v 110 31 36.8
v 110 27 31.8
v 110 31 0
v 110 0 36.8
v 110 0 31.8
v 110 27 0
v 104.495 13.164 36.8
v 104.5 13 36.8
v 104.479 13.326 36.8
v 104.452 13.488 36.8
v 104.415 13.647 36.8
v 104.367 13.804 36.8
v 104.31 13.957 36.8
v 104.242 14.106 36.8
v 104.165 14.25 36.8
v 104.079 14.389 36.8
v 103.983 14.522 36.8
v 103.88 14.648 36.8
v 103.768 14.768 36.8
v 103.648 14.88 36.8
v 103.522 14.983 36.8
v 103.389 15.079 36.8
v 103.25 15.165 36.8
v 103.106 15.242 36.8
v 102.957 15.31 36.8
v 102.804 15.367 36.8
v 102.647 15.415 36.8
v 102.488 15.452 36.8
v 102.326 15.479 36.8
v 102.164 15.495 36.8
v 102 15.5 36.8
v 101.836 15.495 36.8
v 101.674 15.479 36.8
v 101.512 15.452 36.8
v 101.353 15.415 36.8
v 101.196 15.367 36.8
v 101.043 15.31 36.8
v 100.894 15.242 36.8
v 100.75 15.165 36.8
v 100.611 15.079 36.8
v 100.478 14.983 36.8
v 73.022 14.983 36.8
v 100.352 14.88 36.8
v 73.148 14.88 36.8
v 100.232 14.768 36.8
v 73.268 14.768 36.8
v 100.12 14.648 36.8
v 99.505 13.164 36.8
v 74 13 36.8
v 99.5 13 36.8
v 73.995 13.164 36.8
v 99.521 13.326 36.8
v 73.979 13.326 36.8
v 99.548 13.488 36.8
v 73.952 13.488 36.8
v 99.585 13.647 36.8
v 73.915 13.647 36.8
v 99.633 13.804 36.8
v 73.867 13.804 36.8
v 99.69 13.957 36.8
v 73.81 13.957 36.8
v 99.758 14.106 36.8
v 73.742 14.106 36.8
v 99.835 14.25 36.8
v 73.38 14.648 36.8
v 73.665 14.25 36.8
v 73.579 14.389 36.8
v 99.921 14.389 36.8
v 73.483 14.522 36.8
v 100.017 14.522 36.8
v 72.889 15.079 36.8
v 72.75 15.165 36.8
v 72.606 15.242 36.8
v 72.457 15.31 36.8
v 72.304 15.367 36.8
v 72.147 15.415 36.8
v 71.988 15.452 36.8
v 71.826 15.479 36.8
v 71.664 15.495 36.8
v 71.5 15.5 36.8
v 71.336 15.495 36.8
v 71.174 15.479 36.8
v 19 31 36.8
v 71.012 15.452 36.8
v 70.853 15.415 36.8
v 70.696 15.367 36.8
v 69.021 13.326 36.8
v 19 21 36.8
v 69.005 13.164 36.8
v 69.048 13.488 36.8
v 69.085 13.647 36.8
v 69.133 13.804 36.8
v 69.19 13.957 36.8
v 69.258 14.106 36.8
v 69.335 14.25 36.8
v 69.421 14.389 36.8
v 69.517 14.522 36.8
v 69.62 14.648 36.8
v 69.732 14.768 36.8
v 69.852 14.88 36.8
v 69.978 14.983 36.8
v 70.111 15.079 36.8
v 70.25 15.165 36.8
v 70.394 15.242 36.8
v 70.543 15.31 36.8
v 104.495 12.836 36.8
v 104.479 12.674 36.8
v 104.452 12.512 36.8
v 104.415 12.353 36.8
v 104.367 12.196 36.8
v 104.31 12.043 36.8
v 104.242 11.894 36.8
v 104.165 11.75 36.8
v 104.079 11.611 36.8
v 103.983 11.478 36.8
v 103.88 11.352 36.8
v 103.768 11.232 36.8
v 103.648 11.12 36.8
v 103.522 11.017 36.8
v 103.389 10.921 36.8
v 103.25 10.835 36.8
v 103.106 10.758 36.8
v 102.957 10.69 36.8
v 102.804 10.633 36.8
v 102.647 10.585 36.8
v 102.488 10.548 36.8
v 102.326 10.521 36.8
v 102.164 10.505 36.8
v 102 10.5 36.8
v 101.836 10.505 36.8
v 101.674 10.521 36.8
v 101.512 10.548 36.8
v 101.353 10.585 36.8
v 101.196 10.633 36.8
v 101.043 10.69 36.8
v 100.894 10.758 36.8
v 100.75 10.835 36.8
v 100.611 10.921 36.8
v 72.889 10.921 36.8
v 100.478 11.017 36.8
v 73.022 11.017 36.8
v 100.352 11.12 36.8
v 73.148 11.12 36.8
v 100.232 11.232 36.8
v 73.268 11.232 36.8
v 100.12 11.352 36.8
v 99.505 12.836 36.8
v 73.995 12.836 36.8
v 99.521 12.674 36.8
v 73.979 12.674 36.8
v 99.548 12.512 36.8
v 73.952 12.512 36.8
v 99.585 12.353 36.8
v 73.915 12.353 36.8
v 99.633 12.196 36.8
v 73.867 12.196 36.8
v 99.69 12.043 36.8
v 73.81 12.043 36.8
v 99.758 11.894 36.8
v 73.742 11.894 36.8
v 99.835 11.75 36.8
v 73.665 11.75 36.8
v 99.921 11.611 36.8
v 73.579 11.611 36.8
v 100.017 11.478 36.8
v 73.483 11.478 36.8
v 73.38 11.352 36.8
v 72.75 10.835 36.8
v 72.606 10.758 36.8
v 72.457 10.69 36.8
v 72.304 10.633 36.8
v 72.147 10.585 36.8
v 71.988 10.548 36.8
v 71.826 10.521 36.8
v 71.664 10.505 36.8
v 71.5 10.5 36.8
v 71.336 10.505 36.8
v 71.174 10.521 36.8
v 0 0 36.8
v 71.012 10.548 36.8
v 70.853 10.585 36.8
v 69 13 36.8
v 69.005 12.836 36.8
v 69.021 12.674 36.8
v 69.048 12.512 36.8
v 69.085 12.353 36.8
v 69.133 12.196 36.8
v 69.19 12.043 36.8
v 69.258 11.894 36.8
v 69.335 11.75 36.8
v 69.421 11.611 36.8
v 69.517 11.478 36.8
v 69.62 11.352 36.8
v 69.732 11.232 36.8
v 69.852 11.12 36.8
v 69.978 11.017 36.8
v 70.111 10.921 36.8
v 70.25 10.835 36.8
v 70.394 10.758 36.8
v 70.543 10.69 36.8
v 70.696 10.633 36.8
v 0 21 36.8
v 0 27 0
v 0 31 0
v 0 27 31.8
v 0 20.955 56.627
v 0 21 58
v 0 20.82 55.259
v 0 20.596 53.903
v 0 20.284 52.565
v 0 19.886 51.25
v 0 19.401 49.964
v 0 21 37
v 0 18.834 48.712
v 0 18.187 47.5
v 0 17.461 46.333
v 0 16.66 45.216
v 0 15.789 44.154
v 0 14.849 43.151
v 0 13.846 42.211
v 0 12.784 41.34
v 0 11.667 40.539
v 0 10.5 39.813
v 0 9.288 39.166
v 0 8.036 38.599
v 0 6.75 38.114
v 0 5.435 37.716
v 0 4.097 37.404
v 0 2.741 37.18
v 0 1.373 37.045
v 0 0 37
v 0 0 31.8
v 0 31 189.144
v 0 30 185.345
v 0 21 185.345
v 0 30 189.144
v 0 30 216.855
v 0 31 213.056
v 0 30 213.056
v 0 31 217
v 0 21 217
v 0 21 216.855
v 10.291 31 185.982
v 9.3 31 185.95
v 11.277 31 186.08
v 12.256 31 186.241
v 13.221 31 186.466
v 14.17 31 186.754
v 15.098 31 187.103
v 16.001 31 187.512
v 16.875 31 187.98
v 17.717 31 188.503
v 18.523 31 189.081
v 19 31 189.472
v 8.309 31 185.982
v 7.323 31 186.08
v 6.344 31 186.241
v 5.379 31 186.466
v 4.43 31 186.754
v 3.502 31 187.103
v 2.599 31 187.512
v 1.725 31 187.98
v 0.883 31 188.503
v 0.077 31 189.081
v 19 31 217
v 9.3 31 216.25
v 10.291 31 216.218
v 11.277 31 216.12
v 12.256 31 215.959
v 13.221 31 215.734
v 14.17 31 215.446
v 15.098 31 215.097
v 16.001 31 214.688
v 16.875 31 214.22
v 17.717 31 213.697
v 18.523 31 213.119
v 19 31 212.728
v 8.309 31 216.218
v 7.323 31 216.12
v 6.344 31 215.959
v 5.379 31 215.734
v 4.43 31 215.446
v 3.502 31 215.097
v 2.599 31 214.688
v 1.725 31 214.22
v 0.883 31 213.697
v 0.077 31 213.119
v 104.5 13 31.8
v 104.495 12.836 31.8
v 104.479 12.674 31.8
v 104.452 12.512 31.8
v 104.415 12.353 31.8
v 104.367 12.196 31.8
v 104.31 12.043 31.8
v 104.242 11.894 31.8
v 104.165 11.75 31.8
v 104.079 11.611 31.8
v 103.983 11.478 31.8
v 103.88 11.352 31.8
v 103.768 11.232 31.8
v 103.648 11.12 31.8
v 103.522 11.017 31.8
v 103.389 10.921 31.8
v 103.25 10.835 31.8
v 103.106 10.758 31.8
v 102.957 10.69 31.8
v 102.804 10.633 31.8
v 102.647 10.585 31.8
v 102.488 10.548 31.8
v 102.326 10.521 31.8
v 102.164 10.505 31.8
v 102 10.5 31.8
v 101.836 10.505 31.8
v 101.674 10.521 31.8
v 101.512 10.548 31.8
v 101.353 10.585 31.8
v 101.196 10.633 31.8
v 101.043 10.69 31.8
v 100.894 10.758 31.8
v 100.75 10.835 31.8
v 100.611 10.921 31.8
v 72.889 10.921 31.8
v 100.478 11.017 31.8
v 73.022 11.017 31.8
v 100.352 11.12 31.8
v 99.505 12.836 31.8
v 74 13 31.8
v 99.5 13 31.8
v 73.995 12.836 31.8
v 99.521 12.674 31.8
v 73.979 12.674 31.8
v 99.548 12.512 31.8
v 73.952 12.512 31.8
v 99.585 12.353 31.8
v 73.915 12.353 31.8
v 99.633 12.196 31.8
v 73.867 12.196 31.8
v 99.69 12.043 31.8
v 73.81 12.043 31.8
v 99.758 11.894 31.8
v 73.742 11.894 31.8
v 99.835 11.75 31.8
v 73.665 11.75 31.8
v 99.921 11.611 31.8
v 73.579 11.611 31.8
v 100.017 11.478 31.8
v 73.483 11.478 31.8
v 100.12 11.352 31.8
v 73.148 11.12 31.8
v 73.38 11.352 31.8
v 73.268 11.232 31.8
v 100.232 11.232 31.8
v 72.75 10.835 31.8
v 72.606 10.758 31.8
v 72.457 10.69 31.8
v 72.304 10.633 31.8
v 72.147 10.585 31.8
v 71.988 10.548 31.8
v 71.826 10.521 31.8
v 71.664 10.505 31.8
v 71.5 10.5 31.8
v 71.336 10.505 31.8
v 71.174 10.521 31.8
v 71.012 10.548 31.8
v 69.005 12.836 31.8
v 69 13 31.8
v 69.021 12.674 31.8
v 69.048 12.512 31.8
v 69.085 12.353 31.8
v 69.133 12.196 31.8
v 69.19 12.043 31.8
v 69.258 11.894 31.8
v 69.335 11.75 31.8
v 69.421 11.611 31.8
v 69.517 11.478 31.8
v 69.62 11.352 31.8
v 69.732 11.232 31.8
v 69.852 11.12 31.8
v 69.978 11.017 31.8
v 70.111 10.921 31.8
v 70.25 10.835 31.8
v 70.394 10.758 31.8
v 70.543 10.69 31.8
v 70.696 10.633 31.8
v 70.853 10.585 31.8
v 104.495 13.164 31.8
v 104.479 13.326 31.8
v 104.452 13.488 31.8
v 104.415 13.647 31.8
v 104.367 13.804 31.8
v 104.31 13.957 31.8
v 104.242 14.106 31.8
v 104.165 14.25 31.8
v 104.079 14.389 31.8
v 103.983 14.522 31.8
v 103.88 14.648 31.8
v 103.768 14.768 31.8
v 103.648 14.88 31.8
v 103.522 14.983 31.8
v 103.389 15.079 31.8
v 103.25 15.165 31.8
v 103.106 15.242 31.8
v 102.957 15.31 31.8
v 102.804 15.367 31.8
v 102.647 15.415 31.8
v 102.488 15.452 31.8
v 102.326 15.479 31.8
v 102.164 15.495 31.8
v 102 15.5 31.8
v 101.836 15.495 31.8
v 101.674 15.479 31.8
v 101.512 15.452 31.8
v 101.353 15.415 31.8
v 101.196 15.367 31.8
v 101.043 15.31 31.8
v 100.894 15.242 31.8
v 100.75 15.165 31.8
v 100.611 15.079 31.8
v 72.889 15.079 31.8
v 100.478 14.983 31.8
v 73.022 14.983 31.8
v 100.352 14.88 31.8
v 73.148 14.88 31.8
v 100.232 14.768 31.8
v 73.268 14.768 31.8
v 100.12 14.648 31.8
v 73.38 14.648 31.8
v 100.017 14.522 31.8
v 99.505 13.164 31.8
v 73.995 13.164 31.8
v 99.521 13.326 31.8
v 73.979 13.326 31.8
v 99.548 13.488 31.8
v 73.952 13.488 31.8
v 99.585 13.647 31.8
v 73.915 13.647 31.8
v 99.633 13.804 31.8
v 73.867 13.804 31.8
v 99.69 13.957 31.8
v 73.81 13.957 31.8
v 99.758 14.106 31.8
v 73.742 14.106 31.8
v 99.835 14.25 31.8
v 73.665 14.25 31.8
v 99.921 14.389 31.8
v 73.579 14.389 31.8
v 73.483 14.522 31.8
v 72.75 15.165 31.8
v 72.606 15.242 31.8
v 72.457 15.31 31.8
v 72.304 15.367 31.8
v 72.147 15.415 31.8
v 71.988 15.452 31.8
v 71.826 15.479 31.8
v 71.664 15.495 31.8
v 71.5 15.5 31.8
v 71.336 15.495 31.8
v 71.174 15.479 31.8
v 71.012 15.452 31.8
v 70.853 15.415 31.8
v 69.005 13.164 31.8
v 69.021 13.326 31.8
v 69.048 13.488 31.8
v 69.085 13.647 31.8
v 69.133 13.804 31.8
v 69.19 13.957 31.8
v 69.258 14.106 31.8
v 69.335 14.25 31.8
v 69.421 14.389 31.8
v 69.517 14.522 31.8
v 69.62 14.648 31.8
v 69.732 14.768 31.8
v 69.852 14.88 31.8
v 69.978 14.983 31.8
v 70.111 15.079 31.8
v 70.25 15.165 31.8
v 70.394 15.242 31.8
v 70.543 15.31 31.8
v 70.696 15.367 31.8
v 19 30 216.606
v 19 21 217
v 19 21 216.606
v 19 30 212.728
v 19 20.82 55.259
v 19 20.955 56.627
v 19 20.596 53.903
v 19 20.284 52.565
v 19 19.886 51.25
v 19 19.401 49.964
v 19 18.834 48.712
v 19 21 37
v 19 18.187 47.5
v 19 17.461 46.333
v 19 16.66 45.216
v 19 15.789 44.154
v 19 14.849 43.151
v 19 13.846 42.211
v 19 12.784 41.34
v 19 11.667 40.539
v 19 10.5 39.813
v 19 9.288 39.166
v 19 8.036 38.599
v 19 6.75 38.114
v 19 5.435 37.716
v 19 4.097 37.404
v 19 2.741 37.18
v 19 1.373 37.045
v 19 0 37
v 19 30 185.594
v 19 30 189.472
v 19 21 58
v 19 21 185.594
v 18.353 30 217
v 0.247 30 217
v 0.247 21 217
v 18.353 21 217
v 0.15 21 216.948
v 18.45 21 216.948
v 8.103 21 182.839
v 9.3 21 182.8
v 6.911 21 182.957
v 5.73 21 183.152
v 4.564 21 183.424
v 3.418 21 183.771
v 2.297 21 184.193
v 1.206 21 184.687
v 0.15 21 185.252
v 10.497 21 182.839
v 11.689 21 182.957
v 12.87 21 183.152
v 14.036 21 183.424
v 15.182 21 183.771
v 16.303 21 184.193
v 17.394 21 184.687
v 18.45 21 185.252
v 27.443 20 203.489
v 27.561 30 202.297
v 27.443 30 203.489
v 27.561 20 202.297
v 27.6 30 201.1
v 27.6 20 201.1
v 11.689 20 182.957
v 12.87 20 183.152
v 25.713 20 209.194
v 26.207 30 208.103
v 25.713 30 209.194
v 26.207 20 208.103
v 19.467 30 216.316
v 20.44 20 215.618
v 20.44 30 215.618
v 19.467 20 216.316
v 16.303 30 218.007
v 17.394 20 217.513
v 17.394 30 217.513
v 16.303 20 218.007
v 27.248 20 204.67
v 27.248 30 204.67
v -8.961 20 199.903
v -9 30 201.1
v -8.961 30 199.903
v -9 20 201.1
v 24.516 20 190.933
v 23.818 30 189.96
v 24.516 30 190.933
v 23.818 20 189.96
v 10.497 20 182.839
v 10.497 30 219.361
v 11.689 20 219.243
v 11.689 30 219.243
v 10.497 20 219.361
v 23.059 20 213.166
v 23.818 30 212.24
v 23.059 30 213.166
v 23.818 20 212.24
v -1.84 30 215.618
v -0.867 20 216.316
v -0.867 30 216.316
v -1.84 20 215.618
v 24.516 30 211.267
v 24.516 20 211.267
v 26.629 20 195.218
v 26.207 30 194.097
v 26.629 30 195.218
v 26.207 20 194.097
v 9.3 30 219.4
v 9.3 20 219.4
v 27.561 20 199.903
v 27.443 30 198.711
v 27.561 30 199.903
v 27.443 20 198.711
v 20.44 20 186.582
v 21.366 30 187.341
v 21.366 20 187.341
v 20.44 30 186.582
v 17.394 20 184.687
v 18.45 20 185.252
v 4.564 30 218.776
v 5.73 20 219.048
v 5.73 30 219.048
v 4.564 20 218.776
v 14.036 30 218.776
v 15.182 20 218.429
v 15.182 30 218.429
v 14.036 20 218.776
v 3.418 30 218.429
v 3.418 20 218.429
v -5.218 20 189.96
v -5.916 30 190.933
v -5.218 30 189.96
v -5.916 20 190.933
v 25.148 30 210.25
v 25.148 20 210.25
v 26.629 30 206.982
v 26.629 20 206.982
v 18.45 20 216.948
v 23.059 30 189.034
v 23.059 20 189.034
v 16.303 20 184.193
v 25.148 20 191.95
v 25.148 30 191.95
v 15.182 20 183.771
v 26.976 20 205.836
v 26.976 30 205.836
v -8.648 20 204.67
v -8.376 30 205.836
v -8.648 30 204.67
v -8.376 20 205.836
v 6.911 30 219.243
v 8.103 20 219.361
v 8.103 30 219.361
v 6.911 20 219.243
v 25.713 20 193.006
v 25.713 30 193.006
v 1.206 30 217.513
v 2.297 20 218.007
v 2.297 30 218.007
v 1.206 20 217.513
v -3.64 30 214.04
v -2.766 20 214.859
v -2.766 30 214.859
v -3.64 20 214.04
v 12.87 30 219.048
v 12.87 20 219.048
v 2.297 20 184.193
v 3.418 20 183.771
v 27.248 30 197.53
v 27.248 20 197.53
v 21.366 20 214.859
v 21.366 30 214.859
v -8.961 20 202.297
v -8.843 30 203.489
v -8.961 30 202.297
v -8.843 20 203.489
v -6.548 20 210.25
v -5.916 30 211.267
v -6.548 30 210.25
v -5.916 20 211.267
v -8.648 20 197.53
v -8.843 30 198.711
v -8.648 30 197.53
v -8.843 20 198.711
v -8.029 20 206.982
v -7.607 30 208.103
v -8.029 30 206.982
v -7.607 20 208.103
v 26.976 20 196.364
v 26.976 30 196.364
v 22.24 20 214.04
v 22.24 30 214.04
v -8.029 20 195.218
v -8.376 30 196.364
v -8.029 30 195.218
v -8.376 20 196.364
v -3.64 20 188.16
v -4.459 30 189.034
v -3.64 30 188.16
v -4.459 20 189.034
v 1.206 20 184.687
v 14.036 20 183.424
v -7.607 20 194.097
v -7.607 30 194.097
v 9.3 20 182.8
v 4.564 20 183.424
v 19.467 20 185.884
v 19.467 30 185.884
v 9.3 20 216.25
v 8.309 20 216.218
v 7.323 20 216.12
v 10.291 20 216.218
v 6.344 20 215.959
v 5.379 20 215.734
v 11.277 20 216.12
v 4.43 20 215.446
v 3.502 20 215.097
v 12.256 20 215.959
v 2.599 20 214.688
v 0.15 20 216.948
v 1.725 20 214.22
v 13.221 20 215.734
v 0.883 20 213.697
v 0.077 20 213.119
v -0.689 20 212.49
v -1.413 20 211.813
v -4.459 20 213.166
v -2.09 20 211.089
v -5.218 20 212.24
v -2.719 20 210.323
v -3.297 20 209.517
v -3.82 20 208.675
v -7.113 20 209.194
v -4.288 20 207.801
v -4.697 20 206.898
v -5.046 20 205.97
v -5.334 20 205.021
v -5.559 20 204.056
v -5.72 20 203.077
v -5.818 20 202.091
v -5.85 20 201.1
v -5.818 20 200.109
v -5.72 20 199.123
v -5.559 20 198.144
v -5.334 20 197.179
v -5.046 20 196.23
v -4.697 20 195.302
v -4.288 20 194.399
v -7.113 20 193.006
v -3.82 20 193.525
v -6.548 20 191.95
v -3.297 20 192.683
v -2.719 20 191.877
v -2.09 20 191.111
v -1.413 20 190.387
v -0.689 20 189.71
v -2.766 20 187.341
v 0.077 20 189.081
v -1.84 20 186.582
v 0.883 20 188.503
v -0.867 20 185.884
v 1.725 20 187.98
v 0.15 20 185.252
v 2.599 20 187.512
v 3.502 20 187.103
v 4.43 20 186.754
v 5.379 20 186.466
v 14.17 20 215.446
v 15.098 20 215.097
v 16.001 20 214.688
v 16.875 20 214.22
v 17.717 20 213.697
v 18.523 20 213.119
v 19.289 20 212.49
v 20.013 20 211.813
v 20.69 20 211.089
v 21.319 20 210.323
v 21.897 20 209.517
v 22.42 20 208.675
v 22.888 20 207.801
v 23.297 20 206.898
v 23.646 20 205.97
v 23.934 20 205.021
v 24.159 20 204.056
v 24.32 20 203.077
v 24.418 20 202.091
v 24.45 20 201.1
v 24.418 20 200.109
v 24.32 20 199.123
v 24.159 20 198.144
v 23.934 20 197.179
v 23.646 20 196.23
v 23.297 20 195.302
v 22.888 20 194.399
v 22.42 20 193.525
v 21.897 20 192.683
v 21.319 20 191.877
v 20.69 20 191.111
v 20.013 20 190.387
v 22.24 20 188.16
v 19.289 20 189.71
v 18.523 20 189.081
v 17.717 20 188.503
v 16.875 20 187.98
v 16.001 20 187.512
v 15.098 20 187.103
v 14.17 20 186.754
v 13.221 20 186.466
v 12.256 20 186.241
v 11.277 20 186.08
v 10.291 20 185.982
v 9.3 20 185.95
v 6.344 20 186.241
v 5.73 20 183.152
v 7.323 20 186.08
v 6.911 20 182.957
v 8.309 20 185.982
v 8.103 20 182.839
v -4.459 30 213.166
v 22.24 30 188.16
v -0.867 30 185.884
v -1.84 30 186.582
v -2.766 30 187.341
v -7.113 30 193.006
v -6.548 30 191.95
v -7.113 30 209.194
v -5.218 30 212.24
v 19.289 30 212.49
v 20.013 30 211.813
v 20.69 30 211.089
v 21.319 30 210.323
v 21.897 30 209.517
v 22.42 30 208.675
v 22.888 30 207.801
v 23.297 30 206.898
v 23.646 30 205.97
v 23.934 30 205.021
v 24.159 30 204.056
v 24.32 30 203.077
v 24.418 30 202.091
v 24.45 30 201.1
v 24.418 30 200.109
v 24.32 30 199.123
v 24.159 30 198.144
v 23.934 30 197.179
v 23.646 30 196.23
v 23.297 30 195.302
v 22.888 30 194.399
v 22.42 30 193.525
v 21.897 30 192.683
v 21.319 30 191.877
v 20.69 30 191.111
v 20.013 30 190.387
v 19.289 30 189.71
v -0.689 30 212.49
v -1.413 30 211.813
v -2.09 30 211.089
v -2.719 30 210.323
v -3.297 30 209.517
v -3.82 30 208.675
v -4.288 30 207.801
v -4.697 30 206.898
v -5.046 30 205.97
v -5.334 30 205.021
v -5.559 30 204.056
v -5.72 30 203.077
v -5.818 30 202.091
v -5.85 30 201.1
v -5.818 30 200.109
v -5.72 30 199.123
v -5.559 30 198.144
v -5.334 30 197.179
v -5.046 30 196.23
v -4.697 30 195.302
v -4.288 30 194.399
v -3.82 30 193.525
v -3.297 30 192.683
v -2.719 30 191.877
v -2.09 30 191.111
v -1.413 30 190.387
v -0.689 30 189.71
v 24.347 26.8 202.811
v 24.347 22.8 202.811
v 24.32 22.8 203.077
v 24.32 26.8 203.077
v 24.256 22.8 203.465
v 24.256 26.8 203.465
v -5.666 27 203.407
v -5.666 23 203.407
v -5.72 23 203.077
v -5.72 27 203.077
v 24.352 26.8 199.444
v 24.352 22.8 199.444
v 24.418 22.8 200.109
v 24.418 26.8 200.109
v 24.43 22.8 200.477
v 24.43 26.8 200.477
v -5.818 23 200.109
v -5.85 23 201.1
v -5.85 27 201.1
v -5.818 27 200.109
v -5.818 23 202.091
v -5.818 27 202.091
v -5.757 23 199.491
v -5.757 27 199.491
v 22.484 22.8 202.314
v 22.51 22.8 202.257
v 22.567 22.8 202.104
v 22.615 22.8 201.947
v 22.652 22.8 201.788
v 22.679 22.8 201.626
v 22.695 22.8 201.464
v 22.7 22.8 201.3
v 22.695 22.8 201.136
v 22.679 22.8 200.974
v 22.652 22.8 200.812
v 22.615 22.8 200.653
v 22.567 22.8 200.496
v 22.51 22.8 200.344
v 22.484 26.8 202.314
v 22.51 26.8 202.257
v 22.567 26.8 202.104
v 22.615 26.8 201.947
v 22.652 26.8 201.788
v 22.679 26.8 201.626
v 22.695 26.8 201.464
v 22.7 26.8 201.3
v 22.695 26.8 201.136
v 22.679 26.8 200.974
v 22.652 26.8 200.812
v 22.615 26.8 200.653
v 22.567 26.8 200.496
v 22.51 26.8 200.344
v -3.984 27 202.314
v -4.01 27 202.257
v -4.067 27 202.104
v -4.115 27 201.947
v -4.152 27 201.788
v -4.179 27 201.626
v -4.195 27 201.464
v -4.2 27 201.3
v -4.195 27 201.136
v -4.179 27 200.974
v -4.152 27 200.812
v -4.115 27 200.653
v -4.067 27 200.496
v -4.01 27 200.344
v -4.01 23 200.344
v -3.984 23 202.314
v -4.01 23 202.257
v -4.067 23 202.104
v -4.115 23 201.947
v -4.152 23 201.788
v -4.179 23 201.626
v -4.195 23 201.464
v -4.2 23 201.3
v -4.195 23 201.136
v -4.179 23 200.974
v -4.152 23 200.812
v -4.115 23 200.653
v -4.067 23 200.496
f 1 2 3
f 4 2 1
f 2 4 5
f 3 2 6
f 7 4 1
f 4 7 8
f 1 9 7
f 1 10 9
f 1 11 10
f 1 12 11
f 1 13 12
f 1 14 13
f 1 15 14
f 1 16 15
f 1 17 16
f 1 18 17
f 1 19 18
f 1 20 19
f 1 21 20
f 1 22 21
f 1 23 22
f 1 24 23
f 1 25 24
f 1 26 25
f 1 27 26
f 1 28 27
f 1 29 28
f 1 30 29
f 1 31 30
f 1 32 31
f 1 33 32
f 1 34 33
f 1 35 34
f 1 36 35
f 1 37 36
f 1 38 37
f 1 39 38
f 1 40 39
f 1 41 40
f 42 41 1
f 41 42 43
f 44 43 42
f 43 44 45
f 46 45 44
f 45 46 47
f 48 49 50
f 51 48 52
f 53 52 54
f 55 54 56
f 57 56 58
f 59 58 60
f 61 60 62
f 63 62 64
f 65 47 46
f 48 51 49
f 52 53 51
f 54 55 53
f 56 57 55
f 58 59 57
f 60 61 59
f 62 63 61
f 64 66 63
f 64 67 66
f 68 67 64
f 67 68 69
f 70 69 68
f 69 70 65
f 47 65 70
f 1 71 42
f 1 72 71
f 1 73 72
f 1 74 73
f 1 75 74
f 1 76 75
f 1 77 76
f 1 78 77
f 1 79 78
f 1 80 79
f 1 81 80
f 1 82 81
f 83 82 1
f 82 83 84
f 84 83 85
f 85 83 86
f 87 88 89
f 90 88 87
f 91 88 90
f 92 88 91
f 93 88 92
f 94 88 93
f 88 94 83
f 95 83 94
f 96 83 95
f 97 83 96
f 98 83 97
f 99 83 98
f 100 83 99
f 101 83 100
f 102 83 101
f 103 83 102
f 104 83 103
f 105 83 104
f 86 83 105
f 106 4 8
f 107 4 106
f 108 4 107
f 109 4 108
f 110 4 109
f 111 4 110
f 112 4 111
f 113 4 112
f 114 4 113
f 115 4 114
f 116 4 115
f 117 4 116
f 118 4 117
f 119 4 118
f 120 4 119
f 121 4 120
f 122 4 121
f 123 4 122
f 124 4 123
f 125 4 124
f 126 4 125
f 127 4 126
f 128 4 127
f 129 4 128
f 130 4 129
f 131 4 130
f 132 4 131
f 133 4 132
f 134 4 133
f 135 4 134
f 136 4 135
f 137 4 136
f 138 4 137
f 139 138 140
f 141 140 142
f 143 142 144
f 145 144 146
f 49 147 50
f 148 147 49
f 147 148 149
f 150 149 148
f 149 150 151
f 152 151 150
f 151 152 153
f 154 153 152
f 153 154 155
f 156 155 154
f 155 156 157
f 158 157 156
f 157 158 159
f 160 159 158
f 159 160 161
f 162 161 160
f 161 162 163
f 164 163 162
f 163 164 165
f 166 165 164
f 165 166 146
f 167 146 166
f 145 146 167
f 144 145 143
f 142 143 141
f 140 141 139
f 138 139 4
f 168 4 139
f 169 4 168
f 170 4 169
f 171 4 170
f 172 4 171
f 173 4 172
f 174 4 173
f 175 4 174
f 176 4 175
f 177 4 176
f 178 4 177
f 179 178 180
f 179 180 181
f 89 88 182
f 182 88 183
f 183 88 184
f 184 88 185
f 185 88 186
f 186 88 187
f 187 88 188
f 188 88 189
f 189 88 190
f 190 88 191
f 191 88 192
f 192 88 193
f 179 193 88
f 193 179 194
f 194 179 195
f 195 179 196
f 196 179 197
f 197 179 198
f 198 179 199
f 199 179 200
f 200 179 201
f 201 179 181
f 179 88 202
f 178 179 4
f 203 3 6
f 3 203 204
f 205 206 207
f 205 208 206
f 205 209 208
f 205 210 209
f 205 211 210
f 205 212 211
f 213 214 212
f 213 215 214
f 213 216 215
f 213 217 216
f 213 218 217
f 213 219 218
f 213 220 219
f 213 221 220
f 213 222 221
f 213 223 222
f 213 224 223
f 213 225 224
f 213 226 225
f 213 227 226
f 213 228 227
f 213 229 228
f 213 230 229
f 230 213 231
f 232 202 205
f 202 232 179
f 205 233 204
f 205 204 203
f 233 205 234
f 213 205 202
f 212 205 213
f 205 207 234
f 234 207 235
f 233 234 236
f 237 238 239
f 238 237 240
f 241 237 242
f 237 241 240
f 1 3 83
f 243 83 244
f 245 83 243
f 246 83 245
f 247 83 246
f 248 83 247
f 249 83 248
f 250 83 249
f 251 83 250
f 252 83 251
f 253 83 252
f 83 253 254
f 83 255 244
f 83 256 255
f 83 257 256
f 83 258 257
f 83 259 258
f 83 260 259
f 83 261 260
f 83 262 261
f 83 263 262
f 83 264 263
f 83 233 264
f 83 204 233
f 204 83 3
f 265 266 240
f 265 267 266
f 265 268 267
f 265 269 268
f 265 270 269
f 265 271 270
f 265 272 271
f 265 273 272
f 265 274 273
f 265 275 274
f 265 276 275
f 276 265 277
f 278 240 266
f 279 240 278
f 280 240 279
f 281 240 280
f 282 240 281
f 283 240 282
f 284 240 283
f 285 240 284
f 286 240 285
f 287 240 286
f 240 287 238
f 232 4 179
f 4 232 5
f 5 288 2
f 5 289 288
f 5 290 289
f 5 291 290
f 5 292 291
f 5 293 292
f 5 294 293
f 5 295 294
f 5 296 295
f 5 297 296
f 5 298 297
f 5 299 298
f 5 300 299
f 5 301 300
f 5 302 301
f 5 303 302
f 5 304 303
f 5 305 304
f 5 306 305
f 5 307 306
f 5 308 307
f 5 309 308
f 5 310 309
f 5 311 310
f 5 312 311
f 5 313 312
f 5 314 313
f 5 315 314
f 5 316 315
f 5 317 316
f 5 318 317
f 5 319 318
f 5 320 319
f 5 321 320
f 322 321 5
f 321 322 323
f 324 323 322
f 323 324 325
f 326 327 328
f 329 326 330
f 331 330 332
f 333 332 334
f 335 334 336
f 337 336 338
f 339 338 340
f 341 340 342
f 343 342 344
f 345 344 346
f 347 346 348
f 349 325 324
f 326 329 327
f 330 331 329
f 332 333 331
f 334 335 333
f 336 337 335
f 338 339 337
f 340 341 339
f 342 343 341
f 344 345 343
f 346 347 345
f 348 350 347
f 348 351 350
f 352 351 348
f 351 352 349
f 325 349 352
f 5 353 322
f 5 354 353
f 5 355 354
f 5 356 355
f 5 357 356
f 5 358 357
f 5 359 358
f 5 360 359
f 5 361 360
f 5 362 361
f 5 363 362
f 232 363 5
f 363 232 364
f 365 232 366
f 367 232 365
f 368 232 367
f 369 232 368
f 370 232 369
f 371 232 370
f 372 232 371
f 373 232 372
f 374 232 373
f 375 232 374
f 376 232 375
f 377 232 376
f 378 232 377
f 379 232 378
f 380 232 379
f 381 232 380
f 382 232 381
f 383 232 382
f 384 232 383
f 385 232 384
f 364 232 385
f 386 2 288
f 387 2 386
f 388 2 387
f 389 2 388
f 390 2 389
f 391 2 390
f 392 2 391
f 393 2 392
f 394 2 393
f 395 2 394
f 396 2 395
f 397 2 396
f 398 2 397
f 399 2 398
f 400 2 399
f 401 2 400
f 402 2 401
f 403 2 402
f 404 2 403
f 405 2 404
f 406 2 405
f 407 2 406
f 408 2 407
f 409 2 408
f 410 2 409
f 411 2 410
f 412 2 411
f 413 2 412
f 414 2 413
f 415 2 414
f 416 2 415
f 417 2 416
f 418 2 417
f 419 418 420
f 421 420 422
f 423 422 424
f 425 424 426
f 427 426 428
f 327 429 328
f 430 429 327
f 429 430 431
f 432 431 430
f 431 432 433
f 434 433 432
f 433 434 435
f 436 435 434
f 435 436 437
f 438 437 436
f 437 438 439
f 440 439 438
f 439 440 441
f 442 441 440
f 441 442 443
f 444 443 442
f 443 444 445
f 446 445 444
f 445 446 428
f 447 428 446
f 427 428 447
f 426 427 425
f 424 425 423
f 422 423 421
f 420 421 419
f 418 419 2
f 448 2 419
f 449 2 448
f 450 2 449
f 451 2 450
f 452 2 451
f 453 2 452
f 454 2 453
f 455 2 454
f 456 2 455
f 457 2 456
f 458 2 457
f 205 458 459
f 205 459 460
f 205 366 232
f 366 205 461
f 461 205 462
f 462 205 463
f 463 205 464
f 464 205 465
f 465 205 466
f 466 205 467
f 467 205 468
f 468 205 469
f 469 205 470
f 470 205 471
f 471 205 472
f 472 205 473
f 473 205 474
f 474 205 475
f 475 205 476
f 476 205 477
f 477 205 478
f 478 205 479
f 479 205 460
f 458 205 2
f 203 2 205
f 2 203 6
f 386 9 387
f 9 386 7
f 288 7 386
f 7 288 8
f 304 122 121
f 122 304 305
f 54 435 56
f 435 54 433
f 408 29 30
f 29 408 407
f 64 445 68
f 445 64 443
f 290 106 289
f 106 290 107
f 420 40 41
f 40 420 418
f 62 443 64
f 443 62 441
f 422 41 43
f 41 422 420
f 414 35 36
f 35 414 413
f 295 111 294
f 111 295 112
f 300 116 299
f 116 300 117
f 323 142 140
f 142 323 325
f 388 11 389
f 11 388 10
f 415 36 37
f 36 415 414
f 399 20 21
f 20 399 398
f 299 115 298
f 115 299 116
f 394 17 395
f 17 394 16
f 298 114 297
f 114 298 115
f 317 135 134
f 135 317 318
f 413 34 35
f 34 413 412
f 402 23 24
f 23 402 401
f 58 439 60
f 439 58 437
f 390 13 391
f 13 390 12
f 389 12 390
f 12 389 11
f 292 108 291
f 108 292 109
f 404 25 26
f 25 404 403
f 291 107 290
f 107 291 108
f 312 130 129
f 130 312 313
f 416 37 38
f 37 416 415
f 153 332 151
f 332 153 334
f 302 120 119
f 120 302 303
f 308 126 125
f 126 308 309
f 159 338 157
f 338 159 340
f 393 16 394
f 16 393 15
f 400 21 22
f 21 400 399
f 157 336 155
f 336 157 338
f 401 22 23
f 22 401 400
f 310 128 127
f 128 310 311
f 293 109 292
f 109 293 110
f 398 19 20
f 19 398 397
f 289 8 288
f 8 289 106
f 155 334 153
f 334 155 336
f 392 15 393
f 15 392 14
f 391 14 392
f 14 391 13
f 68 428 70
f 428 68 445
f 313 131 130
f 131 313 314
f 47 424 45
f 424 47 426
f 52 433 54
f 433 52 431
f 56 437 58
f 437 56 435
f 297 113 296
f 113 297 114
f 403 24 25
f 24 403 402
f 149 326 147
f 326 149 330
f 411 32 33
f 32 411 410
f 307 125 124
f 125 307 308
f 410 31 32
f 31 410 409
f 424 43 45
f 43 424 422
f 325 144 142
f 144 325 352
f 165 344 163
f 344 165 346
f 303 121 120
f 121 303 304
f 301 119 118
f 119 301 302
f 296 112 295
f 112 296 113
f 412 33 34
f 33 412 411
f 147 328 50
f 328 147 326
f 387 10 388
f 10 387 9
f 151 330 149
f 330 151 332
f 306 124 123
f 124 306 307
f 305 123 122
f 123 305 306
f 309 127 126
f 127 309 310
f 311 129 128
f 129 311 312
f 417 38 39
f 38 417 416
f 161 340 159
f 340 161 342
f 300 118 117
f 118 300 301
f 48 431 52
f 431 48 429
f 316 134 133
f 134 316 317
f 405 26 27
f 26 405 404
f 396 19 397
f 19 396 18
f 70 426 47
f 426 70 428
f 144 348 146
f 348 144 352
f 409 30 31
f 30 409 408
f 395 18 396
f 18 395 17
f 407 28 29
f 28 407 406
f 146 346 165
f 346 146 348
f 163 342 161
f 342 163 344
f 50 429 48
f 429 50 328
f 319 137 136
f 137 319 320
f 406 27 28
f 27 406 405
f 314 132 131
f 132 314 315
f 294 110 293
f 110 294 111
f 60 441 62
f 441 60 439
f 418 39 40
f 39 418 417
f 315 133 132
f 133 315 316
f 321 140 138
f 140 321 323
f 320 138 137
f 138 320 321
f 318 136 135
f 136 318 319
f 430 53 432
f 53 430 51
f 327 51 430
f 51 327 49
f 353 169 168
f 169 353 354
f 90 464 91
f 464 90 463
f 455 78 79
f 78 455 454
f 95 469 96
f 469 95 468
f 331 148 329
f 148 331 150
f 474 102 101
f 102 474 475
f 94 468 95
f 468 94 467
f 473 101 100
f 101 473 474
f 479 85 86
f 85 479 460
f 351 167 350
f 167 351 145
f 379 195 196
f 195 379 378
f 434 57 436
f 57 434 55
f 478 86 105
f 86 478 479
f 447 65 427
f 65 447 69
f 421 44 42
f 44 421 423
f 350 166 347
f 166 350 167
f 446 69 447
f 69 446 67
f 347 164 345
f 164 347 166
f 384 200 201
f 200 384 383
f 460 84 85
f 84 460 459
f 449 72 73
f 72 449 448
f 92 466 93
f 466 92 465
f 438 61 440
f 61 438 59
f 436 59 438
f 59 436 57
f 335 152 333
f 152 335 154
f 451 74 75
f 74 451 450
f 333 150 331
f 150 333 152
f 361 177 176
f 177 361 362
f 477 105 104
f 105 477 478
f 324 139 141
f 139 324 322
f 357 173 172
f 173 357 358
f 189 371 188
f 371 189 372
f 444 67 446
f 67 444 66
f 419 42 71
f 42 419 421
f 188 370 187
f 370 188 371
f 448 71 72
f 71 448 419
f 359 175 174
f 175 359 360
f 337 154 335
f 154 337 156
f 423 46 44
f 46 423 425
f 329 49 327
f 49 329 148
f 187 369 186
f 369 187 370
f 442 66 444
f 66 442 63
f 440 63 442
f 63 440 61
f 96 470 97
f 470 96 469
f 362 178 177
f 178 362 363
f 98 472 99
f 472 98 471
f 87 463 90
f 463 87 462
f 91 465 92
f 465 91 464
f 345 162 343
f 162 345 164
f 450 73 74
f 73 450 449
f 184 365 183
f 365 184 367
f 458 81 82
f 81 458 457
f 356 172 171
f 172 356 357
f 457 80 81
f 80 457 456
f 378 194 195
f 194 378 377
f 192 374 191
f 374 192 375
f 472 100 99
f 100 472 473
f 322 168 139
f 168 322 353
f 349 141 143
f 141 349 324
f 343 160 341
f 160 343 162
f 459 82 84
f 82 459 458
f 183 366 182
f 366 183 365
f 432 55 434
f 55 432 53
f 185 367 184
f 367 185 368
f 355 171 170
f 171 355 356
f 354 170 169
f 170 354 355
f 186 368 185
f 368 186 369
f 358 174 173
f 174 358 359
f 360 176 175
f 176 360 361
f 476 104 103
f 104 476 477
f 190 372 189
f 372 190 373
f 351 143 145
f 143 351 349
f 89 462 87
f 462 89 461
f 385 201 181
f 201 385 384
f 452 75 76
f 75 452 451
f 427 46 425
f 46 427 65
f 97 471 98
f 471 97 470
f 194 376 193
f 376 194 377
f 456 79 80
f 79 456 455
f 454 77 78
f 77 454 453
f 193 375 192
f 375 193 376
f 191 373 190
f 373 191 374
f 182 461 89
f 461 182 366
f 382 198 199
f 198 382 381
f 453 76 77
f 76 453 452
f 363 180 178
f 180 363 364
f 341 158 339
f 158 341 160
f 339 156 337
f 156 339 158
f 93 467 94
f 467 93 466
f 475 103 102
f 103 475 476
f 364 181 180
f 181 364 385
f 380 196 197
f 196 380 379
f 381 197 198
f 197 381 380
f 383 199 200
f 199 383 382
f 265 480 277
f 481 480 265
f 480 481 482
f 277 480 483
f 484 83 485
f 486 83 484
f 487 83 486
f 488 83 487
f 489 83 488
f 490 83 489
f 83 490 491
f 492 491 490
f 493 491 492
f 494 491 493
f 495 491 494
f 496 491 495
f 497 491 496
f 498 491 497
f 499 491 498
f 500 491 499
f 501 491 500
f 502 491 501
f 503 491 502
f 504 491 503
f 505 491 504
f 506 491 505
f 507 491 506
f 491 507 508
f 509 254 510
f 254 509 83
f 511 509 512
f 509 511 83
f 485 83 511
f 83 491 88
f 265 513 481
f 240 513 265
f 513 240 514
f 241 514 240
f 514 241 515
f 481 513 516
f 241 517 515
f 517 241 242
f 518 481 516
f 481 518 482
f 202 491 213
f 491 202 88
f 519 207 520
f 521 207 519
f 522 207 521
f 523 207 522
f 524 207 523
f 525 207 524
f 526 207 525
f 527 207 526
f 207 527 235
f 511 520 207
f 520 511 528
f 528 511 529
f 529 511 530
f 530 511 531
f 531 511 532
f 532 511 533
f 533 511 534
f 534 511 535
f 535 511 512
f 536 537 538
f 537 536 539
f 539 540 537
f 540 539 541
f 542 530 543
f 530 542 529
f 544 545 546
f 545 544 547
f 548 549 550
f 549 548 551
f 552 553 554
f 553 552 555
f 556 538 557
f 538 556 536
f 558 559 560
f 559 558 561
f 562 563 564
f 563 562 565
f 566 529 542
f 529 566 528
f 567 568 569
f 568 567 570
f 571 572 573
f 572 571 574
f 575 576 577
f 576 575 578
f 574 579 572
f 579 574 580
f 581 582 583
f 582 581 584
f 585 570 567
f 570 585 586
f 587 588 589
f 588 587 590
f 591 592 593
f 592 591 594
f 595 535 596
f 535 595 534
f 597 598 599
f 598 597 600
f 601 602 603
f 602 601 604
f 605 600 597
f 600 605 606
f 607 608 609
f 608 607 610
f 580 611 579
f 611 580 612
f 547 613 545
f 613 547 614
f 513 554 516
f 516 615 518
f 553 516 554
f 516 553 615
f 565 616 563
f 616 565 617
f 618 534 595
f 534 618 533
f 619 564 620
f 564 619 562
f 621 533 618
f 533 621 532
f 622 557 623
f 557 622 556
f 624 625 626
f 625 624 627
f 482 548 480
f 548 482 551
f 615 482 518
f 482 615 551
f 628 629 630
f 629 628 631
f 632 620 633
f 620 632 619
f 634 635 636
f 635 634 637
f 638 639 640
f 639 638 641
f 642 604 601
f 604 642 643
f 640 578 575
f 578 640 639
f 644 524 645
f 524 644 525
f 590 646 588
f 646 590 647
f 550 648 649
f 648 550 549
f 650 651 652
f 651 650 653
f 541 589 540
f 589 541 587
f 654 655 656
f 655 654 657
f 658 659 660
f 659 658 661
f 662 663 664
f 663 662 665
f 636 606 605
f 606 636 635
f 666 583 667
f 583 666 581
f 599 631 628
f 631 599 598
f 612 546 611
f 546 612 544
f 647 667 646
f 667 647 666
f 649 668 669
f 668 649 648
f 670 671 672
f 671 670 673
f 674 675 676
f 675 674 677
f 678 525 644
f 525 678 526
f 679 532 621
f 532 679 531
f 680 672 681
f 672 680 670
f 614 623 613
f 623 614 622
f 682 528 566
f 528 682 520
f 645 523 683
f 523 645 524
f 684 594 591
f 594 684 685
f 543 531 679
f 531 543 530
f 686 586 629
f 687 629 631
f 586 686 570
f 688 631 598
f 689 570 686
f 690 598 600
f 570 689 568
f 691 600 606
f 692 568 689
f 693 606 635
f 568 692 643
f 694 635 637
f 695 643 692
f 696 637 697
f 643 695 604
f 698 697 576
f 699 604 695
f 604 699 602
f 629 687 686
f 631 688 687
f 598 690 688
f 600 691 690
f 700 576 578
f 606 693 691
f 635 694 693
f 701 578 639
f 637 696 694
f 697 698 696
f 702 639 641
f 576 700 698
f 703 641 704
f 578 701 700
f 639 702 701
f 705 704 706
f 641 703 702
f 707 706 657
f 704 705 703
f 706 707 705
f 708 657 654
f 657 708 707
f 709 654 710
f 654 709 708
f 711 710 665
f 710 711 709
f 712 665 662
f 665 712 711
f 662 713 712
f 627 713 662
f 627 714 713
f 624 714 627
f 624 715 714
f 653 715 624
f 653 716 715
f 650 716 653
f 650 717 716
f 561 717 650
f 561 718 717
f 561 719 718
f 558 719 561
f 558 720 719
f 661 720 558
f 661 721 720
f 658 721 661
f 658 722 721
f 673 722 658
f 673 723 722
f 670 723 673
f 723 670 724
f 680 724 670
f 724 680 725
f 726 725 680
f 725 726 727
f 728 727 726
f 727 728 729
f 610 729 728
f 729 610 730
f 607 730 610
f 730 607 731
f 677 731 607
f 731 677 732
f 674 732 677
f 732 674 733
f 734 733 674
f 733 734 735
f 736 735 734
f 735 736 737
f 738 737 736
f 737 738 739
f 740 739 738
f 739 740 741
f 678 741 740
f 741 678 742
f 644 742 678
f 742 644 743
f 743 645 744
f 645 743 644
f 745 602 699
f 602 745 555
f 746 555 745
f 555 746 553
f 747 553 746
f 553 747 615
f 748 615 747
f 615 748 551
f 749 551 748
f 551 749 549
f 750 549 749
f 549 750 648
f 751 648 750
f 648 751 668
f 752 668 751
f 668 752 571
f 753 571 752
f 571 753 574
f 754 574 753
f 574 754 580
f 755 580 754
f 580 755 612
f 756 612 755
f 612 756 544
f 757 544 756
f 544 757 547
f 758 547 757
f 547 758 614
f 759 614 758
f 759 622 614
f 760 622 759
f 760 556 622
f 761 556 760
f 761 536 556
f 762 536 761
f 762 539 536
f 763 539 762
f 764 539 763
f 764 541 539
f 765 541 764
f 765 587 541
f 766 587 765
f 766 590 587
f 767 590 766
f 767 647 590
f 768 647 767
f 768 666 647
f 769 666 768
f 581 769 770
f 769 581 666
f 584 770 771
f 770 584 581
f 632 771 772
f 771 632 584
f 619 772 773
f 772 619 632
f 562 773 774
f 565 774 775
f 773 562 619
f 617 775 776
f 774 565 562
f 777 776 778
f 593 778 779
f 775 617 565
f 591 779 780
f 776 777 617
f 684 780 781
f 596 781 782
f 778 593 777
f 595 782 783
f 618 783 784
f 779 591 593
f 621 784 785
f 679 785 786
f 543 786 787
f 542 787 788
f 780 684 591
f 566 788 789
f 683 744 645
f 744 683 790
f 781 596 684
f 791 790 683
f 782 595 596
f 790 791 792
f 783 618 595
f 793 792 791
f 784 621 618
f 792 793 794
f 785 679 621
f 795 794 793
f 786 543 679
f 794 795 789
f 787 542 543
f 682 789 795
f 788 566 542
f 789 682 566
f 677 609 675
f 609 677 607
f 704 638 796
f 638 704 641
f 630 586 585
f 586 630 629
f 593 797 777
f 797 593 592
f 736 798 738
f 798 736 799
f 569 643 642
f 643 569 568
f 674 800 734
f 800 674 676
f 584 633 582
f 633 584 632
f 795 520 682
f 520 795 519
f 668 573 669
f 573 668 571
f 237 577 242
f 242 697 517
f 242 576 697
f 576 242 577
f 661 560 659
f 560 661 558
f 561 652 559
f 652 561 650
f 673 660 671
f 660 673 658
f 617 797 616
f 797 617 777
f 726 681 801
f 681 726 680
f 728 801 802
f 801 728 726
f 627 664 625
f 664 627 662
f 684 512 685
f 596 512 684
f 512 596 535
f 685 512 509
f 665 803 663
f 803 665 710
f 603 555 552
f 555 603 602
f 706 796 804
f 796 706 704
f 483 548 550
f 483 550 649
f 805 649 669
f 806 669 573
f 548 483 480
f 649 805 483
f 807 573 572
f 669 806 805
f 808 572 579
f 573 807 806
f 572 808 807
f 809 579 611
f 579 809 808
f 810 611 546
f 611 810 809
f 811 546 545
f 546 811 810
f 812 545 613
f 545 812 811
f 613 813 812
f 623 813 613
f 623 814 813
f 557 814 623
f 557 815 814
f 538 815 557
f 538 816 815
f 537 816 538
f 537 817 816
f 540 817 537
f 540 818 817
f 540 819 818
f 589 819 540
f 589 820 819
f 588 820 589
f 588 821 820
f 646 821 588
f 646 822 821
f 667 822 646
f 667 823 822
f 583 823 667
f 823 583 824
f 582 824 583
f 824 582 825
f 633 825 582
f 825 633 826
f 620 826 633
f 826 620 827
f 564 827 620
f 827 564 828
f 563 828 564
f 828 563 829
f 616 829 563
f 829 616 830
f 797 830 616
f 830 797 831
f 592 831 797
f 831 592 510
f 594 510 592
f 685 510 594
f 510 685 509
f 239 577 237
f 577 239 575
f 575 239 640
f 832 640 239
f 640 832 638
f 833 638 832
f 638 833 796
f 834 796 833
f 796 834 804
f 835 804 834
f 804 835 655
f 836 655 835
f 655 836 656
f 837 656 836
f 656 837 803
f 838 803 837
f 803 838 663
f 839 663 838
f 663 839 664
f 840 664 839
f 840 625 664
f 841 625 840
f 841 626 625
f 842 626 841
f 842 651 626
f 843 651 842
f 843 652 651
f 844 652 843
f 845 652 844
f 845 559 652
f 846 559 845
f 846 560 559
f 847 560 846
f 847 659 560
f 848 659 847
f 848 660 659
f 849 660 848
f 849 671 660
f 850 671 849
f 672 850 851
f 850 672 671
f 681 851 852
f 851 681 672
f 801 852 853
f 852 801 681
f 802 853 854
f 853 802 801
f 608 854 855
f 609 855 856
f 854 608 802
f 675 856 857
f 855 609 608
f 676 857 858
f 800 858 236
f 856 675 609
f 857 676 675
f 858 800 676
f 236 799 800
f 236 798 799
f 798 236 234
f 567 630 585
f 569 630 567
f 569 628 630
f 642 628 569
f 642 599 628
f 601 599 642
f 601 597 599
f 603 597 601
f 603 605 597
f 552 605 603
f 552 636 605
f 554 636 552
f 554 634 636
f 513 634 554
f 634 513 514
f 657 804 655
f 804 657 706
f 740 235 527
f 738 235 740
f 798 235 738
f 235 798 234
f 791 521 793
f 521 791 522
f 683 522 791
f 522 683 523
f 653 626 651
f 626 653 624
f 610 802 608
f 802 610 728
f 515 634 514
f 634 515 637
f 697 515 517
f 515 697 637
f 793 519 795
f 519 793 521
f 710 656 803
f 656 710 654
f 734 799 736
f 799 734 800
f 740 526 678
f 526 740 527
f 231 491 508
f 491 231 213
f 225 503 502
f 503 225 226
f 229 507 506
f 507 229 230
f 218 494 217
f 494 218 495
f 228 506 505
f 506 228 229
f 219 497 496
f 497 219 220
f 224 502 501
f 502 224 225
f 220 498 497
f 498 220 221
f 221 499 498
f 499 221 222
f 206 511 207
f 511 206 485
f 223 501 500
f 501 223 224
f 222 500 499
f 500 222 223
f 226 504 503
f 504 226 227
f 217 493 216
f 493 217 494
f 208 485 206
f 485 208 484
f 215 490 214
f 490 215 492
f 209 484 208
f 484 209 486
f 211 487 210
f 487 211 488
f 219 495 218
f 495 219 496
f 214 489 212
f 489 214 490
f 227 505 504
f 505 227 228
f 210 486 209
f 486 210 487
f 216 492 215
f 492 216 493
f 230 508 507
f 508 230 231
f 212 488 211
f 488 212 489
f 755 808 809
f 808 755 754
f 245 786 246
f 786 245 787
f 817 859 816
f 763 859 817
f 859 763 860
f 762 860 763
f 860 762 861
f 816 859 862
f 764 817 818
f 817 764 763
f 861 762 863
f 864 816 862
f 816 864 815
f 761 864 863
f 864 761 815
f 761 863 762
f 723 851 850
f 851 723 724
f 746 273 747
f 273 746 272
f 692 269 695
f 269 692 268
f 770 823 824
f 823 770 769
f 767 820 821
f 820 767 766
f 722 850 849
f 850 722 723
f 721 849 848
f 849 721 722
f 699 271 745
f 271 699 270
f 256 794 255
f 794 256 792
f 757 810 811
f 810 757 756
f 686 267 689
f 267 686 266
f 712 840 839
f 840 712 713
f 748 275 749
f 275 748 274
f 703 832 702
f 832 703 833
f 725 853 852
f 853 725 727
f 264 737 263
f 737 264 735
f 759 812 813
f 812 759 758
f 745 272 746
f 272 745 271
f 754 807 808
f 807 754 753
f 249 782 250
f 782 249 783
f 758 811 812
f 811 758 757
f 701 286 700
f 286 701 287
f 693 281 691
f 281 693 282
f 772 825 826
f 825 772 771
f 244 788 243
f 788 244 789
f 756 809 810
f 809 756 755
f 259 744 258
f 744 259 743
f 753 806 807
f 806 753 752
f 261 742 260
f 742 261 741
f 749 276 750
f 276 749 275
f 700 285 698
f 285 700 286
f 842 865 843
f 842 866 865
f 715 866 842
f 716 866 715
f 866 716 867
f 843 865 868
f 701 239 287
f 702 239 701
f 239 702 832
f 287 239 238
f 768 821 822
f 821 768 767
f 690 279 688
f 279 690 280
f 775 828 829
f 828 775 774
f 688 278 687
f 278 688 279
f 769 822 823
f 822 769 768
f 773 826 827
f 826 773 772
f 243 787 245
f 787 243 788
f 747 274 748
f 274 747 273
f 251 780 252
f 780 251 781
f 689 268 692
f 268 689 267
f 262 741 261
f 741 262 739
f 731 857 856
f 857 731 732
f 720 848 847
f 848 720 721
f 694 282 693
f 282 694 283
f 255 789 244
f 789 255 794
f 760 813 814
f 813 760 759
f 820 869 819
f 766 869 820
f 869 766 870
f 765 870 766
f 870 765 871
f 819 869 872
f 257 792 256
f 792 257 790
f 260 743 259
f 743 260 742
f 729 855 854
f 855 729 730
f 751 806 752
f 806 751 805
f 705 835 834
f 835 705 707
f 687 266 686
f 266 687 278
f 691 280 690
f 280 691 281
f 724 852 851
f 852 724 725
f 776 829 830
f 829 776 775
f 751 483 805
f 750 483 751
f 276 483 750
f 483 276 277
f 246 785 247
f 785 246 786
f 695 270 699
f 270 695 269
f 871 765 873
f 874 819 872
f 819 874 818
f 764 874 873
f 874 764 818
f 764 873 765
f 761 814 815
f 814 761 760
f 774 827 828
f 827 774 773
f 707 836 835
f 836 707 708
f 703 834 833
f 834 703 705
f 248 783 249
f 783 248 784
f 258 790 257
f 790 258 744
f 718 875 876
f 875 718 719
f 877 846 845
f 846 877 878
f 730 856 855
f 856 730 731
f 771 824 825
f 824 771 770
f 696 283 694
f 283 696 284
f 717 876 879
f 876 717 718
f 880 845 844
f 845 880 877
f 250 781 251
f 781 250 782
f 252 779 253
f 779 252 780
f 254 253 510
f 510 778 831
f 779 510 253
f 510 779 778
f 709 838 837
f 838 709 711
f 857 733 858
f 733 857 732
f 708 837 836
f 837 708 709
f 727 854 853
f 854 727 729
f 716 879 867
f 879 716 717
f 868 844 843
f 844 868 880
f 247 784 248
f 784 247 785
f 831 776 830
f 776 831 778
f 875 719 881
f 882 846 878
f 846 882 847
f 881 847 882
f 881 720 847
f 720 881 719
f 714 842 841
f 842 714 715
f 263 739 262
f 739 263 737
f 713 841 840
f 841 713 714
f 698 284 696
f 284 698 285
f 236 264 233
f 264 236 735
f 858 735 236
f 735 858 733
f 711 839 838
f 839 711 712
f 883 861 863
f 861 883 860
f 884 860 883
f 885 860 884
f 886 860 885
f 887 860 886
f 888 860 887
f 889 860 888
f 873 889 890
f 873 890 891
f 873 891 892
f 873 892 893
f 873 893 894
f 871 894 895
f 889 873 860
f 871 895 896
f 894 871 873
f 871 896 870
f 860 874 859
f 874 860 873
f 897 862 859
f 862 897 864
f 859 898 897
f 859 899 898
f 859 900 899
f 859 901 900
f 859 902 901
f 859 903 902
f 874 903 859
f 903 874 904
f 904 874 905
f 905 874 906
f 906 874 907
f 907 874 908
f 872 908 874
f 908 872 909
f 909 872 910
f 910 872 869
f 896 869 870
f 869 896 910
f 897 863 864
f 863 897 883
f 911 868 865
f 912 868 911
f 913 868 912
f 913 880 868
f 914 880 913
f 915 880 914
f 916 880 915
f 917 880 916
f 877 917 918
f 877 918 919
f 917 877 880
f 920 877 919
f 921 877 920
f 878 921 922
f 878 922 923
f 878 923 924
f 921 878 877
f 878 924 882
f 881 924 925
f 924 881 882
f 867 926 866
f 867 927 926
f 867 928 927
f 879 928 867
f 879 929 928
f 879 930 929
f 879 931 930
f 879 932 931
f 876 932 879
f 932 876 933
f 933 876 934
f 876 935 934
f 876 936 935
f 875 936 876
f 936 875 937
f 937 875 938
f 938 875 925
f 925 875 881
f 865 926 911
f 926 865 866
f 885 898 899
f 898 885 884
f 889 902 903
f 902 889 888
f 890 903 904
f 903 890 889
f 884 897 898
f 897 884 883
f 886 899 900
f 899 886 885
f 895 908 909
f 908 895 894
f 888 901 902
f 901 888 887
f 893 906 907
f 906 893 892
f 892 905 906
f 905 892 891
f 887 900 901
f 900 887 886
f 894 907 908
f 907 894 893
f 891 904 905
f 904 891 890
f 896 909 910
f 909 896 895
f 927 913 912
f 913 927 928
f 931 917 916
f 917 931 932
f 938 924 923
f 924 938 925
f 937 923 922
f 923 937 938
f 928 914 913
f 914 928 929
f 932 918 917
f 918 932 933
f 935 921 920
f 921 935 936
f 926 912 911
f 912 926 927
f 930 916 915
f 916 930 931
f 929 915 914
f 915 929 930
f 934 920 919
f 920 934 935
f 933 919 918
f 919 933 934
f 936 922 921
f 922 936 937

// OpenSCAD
$fn=96;
//use <roundedcube/roundedcube.scad>;

arm_length=181.2;
bar_depth=27;
base_width=110;
base_depth=27;
base_height=32.8;
base_x=0;
base_y=0;
base_z=0;
mount_hole_short_depth=14;
mount_hole_long_depth=17;
arm_x=0;
arm_y=10;
arm_z=35.8;
spool_mount_x=arm_x+9.3;    // =18.3
spool_mount_y=arm_y+20;     // =10
spool_mount_z=arm_z+165.3;  // =205.3

module base() {
    difference() {
        union() {
            //translate([base_x, base_y-3, base_z])
              cube([ base_width, base_depth+4, base_height+4 ]);
        }
        translate([base_x, base_y, base_z-1])
        cube([base_width, base_depth, base_height]);
        translate([base_width-8, base_depth-mount_hole_short_depth, base_height-1]) cylinder(h = 5, r = 2.5);
        translate([base_width-38.5, base_depth-mount_hole_short_depth, base_height-1]) cylinder(h = 5, r = 2.5);
        
    }
}
/*
module Trapaziod3D(height, topWidth, topLength, bottomWidth, bottomLength)
{
hull()
{
cube([bottomWidth, bottomLength, .1], center = true);
translate([0,0,height])
{
cube([topWidth, topLength, .1], center = true);
}
}
}
*/

module arm() {
    difference() {
        union() {
            translate([arm_x, arm_y+11, arm_z+1]) 
             cube([ 19, 10, arm_length-1 ]);
            translate([spool_mount_x, spool_mount_y, spool_mount_z]) 
            rotate([90, 0, 0]) 
              cylinder(h = 10, d = 36.6 );
            translate([0, 0, 37]) 
              cube([ 19, 21, 21 ]);
        }  
          translate([0, 0, 58]) 
          rotate([90, 0, 90]) 
          cylinder(h=40, r = 21);
            //translate([spool_mount_x+16, spool_mount_y-17.2, spool_mount_z+2.2]) rotate([90, 78, 180]) linear_extrude(height = 4) {
                //polygon(points = [[0, 1], [4, 0], [3.5, 2], [3, 4]]);
            //}
            //translate([spool_mount_x-16.1, spool_mount_y-13, spool_mount_z+2.2]) rotate([90, 78, 0]) linear_extrude(height = 4) {
              //  polygon(points = [[0, 1], [4, 0], [3.5, 2], [3, 4]]);
            //}
        
        
        //Add notches to arm

        translate([spool_mount_x, spool_mount_y+1, spool_mount_z]) rotate([90, 0, 0]) cylinder(h = 22, d = 30.3);
                
 }
 
 
//add spool stops
difference() {
    union() {
        translate([spool_mount_x+16, spool_mount_y-7.2, spool_mount_z+2.2]) rotate([90, 78, 180]) linear_extrude(height = 4) {
            polygon(points = [[0, 1], [4, 0], [3.5, 2], [3, 4]]);
        }
        translate([spool_mount_x-16.1, spool_mount_y-3, spool_mount_z+2.2]) rotate([90, 78, 0]) linear_extrude(height = 4) {
            polygon(points = [[0, 1], [4, 0], [3.5, 2], [3, 4]]);
        }
    }
    translate([spool_mount_x+10.9, spool_mount_y-2.9, spool_mount_z+.2]) rotate([90, 0, 0]) cylinder(h = 5, r = 2.5);
    translate([spool_mount_x-11, spool_mount_y-2.9, spool_mount_z+.2]) rotate([90, 0, 0]) cylinder(h = 5, r = 2.5);
}
}

//polygon(points = [[0, 0], [10/2, 15], [10, 0]]);




// Twist Lock Cylinder

/*
$fn = 100; // Number of facets for a smooth cylinder

arch_base   = 4;
arch_angle  = 160;
arch_radius = 15;

difference() {
    union() {
        cylinder(h = 10, d = 29.8, center = true);
    }
    translate([0, 0, 0]) cylinder(10.2, r = 6, center = true);
    rotate( [0, 0, 0])
    rotate_extrude( angle = arch_angle, $fn = 100 )
    translate( [-arch_radius, 0] )
    difference()
    translate( [0, -arch_base / 2] )
    square( arch_base );
    rotate( [180, 180, 0])
   rotate_extrude( angle = arch_angle, $fn = 100 )
    translate( [-arch_radius, 0] )
    difference()
    translate( [0, -arch_base / 2] )
    square( arch_base );
        
    //Add entrance notches
    rotate( [180, 180, 0])
    rotate_extrude( angle = 20, $fn = 100 )
    translate( [-arch_radius, 0] )
    difference()
    translate( [0, -arch_base / 2.2] )
    square( [4, 7] );
    rotate( [180, 180, 0])
    rotate_extrude( angle = 20, $fn = 100 )
    translate( [-arch_radius, 0] )
    difference()
    translate( [0 + 26.1, -arch_base / 2.2] )
    square( [4, 7] );
}    

    

//Add a bump
    union()
        translate ([9, -6, 0]) 
        cylinder(4, r = 1, center =true);
        translate ([-9, 6, 0]) 
        cylinder(4, r = 1, center =true);
*/






base();
//Trapaziod3D(4, 7, 10, 7, 15);
arm();
